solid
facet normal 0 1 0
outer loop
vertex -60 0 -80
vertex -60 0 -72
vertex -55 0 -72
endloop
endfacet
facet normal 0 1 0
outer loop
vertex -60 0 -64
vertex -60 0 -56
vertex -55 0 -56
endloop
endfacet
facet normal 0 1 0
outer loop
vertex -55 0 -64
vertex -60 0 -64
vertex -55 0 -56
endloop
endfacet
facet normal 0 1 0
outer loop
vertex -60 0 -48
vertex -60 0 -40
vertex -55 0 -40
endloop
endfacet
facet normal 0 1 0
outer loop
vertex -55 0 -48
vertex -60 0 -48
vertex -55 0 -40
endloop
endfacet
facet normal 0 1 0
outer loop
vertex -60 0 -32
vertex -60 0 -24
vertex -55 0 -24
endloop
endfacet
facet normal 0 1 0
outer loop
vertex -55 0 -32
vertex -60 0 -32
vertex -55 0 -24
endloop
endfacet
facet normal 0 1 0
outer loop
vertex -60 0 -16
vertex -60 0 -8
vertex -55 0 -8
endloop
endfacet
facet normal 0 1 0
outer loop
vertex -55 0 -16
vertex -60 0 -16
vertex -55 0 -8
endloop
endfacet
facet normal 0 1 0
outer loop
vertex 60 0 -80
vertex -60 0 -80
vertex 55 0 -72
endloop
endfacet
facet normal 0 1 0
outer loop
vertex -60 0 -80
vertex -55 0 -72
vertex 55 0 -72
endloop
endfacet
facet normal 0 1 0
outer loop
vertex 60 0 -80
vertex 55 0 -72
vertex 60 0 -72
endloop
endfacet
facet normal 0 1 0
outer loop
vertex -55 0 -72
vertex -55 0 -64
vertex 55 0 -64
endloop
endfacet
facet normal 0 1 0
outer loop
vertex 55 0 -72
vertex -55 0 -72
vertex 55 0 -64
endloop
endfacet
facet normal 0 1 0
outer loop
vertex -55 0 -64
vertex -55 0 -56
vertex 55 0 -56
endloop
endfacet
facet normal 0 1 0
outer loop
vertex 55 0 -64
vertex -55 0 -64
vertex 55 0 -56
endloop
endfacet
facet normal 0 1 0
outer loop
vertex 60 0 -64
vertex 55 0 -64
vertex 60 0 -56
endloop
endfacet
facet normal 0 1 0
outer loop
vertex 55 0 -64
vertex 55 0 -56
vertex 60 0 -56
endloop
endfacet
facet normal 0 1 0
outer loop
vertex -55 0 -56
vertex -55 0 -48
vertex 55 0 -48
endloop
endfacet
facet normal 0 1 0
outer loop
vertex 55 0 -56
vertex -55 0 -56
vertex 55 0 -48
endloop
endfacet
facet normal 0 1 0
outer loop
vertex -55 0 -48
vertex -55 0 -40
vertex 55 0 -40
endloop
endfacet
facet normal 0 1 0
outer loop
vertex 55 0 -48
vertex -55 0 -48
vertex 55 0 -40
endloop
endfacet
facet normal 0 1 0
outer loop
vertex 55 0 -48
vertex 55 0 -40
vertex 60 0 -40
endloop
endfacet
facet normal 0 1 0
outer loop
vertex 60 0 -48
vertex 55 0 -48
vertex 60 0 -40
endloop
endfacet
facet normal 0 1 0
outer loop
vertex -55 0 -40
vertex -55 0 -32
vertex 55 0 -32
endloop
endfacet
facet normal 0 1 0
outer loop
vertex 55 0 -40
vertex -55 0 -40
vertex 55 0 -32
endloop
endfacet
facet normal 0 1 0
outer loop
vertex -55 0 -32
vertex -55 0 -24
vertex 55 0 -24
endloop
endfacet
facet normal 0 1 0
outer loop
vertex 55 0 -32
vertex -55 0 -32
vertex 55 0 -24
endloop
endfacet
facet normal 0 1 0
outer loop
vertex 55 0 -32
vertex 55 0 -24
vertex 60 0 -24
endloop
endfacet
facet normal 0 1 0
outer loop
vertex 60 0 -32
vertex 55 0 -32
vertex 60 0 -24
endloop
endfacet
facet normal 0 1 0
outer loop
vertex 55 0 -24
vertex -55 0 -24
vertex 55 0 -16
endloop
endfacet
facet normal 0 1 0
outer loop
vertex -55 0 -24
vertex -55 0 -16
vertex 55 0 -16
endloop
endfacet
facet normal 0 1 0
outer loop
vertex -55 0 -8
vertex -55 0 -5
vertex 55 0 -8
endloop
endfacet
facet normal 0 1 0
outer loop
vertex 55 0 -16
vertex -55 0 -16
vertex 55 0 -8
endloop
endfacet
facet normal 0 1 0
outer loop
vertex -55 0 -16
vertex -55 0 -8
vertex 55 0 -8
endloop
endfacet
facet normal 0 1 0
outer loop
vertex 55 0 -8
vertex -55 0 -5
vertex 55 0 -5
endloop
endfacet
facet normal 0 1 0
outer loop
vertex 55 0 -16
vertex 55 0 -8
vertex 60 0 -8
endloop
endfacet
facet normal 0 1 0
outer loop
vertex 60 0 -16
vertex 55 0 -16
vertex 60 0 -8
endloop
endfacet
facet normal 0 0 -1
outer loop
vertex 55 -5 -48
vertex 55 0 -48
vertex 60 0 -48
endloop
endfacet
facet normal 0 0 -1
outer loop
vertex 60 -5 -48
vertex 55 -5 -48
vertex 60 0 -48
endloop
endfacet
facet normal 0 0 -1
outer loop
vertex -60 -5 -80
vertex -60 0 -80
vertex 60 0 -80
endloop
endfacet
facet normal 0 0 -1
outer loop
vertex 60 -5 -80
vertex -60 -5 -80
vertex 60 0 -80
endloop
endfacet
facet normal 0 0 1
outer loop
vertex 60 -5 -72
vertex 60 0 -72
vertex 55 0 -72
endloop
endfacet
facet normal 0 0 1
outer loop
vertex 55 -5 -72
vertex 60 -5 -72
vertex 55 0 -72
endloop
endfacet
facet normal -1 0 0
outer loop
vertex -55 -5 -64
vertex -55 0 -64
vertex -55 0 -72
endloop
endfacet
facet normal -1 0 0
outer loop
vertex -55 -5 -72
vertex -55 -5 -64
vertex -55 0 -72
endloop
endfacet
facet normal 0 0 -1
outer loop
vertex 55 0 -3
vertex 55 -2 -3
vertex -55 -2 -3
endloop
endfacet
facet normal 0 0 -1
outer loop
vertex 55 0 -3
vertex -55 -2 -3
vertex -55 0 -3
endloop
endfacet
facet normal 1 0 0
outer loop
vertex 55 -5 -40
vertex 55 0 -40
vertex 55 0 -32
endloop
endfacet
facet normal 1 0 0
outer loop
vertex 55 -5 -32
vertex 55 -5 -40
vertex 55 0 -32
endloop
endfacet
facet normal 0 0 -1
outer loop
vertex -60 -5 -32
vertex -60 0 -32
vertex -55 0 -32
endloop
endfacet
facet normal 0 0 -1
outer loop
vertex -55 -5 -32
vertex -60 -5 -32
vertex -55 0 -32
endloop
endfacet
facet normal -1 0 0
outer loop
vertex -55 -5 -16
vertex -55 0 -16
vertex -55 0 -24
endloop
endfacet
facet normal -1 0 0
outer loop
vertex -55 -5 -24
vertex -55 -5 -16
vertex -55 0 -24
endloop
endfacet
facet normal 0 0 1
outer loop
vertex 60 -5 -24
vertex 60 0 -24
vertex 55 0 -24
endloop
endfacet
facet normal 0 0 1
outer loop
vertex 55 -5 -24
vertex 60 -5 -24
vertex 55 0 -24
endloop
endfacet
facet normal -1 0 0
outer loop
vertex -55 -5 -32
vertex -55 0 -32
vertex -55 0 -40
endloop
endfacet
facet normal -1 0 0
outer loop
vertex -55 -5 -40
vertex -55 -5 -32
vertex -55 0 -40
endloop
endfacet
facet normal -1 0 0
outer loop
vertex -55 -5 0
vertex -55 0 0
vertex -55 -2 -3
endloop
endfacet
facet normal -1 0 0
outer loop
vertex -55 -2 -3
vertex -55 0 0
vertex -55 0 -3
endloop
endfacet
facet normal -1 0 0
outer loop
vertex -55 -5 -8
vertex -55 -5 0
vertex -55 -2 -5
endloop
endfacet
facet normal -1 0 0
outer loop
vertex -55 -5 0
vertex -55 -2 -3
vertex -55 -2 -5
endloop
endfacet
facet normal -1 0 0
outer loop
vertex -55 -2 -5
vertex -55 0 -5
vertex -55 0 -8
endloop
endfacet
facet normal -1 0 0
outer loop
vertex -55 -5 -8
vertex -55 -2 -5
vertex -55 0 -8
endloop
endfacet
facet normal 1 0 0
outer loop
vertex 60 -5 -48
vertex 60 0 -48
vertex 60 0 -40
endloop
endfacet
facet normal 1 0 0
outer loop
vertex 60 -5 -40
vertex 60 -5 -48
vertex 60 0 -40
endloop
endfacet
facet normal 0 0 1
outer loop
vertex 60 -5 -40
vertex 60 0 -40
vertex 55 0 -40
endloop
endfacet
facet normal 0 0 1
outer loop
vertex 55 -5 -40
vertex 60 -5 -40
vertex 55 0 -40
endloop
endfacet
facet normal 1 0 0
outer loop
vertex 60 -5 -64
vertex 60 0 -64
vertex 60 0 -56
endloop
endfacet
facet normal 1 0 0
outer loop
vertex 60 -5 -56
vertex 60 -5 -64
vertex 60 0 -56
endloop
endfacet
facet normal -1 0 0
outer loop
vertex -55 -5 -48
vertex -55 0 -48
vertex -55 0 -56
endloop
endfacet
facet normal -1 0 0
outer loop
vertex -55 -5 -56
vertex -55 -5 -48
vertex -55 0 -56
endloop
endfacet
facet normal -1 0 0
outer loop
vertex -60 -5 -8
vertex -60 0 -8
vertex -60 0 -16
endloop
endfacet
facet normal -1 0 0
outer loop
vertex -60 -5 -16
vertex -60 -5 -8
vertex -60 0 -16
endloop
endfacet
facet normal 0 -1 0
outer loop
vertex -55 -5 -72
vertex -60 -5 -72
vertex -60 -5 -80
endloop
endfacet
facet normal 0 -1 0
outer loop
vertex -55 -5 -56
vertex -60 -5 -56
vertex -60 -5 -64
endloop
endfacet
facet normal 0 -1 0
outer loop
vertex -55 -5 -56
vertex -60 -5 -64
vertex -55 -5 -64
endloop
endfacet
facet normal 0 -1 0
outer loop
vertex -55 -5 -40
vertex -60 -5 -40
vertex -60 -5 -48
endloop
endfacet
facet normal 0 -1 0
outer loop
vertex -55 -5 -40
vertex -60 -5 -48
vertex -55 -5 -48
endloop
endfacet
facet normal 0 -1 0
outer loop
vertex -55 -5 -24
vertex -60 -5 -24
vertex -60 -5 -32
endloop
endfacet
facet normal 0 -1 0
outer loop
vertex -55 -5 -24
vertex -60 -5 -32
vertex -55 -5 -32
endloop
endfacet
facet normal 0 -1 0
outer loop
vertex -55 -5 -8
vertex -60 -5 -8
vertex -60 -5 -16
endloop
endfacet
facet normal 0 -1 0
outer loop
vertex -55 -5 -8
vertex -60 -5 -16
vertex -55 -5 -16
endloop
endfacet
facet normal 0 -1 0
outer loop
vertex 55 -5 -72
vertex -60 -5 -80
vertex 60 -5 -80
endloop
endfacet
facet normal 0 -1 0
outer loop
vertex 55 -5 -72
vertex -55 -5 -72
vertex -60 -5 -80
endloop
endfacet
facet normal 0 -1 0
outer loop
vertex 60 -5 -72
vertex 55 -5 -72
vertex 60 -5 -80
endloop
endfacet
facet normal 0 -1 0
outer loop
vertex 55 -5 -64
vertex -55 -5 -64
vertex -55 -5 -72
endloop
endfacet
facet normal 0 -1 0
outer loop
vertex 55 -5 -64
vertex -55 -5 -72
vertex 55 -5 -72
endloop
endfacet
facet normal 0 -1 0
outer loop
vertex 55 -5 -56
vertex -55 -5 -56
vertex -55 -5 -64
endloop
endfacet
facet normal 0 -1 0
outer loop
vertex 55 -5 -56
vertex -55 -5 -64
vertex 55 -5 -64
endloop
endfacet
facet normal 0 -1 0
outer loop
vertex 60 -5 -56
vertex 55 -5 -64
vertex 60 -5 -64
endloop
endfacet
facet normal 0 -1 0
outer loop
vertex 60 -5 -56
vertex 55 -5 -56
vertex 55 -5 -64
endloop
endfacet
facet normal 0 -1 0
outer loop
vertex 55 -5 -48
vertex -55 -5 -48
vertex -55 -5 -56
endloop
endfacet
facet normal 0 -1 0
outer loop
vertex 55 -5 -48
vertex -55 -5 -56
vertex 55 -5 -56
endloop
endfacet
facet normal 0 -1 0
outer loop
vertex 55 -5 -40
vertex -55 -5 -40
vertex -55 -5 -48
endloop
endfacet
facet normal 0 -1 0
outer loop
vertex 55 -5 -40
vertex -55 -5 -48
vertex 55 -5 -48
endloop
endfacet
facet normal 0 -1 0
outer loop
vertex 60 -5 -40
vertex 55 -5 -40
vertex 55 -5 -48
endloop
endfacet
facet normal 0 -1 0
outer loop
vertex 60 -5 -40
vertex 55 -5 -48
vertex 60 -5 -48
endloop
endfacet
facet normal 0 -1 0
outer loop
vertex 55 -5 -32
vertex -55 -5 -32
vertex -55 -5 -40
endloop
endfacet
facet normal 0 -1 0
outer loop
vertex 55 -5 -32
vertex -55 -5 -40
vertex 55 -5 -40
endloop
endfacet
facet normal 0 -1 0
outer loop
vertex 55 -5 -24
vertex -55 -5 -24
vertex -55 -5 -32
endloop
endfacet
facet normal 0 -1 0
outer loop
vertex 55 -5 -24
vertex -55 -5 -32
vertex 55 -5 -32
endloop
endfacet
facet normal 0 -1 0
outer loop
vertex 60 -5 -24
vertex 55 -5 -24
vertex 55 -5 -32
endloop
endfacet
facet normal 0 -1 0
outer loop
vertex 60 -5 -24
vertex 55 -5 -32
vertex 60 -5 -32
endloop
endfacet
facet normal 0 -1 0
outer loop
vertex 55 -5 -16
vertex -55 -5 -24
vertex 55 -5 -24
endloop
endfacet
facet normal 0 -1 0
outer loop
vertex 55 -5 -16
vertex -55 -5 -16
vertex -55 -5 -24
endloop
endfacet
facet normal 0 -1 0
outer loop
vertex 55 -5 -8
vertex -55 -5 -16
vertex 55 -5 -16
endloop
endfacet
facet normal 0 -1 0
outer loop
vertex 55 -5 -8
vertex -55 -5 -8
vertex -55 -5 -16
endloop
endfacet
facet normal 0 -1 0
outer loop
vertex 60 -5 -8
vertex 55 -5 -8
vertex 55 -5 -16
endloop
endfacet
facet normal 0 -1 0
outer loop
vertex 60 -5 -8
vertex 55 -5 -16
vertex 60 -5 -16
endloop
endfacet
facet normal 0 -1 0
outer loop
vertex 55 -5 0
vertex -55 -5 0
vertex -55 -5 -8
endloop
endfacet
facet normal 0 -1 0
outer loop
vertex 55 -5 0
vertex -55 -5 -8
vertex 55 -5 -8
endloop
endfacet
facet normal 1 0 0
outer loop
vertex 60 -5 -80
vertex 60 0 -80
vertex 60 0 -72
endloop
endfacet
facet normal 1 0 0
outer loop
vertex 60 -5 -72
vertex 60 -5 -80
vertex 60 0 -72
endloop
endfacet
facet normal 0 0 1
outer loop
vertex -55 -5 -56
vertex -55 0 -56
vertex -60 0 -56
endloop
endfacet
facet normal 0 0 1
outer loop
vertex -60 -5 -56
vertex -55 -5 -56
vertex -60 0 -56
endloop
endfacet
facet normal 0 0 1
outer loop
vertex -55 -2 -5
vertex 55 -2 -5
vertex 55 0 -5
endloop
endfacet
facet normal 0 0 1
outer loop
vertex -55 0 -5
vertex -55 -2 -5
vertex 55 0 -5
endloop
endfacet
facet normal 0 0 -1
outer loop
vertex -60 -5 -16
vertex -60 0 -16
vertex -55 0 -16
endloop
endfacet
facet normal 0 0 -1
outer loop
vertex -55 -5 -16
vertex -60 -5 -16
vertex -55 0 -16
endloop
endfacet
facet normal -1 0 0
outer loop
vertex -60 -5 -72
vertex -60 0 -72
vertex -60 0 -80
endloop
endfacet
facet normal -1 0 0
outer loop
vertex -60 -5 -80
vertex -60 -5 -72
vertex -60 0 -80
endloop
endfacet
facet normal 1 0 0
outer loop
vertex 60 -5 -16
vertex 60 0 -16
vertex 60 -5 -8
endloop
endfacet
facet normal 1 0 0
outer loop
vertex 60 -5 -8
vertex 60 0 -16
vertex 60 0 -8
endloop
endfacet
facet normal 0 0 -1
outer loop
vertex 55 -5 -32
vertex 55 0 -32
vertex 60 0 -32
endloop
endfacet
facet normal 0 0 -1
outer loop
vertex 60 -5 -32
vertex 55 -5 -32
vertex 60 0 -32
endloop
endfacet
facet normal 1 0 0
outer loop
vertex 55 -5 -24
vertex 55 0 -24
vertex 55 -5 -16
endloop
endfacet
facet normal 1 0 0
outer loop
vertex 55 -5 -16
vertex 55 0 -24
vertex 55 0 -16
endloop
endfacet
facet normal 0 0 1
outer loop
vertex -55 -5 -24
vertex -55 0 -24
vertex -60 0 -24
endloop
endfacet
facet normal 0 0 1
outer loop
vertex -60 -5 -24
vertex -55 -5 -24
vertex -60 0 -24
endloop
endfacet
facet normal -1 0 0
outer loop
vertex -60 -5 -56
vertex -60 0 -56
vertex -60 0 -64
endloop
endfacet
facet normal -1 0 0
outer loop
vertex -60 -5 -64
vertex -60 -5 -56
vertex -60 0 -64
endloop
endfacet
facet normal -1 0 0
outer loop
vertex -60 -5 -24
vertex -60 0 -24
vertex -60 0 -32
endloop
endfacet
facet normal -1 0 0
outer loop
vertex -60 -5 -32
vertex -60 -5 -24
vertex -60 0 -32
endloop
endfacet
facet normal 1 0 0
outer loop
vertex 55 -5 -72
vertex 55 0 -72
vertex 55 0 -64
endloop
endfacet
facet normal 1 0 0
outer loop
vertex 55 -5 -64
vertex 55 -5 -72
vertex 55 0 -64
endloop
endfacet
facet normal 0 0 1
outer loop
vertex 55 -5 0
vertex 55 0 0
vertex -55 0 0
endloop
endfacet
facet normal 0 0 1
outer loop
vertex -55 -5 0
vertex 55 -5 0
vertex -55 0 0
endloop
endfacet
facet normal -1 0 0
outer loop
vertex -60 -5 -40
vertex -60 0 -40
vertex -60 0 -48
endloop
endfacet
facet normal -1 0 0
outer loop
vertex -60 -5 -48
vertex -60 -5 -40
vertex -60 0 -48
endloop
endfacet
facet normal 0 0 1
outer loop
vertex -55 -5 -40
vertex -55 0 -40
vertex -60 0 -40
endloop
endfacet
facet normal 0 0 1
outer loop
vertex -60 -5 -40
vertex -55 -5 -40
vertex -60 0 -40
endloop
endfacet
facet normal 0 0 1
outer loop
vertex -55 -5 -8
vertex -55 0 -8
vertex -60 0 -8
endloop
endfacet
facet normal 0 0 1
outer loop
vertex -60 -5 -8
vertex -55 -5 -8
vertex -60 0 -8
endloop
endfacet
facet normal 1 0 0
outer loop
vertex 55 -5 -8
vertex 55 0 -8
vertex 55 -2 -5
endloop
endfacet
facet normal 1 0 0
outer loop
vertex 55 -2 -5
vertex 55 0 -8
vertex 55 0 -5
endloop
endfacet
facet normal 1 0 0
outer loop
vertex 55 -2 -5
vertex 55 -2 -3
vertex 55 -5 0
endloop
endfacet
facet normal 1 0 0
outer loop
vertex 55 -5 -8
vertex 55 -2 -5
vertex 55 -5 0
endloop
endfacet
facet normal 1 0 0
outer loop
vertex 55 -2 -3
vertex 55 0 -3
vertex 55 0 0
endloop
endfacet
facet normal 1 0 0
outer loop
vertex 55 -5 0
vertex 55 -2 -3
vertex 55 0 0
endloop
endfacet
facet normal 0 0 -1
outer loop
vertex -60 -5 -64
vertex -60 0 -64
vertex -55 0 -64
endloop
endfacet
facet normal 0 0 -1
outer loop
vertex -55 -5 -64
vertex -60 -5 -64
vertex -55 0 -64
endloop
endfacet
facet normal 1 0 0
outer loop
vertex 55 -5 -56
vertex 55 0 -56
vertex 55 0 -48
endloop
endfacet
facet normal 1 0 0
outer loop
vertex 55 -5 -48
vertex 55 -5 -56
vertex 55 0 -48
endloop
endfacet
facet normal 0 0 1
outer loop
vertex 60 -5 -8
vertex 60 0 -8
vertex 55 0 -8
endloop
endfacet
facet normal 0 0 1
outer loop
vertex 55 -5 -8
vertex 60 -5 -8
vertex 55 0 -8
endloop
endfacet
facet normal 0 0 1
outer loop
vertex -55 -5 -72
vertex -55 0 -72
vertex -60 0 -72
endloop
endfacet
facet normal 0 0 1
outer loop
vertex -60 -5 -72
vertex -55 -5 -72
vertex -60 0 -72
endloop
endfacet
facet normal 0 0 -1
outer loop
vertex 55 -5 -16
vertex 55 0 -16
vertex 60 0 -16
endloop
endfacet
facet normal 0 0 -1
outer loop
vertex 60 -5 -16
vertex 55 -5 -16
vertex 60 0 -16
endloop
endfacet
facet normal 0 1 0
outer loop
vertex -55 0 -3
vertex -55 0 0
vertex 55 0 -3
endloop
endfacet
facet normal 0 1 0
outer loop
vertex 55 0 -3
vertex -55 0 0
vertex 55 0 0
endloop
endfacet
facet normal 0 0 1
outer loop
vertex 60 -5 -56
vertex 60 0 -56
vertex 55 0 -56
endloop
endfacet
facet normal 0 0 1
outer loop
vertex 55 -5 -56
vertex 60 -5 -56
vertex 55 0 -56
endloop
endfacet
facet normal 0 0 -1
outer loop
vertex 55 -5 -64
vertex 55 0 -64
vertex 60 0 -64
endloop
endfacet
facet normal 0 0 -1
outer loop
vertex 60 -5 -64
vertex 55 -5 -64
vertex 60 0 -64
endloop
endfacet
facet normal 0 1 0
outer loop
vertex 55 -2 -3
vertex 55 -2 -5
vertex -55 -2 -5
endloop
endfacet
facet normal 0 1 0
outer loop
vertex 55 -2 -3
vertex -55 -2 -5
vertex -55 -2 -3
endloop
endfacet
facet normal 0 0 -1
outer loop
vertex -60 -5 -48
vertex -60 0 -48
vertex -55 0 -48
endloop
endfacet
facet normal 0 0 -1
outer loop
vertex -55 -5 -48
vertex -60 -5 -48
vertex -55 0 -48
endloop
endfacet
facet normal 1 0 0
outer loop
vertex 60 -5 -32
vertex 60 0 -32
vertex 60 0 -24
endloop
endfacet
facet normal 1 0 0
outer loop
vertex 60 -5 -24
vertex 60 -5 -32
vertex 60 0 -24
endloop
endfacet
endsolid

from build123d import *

# Parameters (mm, degrees)
F2_DEPTH = 5
F3_W     = 2
F3_H     = 2
F4_DEPTH = 120.001


# Not quite as in the source:
# - a feature names something its author has since deleted; it is built from what else it names


with BuildPart() as f2:
    # F1 (on Front) → F2 (new body)
    with BuildSketch(Plane.XZ):
        Polygon((55, -8), (55, 0), (-55, 0), (-55, -8), (-60, -8), (-60, -16), (-55, -16), (-55, -24), (-60, -24), (-60, -32), (-55, -32), (-55, -40), (-60, -40), (-60, -48), (-55, -48), (-55, -56), (-60, -56), (-60, -64), (-55, -64), (-55, -72), (-60, -72), (-60, -80), (60, -80), (60, -72), (55, -72), (55, -64), (60, -64), (60, -56), (55, -56), (55, -48), (60, -48), (60, -40), (55, -40), (55, -32), (60, -32), (60, -24), (55, -24), (55, -16), (60, -16), (60, -8), align=None)
    extrude(amount=F2_DEPTH)

    # F3 (on face) → F4 (cut, through all)
    with BuildSketch(Plane.YZ.offset(60)):
        with Locations((-1, -4)):
            Rectangle(F3_W, F3_H)
    extrude(amount=-F4_DEPTH, mode=Mode.SUBTRACT)


solid = f2.part
